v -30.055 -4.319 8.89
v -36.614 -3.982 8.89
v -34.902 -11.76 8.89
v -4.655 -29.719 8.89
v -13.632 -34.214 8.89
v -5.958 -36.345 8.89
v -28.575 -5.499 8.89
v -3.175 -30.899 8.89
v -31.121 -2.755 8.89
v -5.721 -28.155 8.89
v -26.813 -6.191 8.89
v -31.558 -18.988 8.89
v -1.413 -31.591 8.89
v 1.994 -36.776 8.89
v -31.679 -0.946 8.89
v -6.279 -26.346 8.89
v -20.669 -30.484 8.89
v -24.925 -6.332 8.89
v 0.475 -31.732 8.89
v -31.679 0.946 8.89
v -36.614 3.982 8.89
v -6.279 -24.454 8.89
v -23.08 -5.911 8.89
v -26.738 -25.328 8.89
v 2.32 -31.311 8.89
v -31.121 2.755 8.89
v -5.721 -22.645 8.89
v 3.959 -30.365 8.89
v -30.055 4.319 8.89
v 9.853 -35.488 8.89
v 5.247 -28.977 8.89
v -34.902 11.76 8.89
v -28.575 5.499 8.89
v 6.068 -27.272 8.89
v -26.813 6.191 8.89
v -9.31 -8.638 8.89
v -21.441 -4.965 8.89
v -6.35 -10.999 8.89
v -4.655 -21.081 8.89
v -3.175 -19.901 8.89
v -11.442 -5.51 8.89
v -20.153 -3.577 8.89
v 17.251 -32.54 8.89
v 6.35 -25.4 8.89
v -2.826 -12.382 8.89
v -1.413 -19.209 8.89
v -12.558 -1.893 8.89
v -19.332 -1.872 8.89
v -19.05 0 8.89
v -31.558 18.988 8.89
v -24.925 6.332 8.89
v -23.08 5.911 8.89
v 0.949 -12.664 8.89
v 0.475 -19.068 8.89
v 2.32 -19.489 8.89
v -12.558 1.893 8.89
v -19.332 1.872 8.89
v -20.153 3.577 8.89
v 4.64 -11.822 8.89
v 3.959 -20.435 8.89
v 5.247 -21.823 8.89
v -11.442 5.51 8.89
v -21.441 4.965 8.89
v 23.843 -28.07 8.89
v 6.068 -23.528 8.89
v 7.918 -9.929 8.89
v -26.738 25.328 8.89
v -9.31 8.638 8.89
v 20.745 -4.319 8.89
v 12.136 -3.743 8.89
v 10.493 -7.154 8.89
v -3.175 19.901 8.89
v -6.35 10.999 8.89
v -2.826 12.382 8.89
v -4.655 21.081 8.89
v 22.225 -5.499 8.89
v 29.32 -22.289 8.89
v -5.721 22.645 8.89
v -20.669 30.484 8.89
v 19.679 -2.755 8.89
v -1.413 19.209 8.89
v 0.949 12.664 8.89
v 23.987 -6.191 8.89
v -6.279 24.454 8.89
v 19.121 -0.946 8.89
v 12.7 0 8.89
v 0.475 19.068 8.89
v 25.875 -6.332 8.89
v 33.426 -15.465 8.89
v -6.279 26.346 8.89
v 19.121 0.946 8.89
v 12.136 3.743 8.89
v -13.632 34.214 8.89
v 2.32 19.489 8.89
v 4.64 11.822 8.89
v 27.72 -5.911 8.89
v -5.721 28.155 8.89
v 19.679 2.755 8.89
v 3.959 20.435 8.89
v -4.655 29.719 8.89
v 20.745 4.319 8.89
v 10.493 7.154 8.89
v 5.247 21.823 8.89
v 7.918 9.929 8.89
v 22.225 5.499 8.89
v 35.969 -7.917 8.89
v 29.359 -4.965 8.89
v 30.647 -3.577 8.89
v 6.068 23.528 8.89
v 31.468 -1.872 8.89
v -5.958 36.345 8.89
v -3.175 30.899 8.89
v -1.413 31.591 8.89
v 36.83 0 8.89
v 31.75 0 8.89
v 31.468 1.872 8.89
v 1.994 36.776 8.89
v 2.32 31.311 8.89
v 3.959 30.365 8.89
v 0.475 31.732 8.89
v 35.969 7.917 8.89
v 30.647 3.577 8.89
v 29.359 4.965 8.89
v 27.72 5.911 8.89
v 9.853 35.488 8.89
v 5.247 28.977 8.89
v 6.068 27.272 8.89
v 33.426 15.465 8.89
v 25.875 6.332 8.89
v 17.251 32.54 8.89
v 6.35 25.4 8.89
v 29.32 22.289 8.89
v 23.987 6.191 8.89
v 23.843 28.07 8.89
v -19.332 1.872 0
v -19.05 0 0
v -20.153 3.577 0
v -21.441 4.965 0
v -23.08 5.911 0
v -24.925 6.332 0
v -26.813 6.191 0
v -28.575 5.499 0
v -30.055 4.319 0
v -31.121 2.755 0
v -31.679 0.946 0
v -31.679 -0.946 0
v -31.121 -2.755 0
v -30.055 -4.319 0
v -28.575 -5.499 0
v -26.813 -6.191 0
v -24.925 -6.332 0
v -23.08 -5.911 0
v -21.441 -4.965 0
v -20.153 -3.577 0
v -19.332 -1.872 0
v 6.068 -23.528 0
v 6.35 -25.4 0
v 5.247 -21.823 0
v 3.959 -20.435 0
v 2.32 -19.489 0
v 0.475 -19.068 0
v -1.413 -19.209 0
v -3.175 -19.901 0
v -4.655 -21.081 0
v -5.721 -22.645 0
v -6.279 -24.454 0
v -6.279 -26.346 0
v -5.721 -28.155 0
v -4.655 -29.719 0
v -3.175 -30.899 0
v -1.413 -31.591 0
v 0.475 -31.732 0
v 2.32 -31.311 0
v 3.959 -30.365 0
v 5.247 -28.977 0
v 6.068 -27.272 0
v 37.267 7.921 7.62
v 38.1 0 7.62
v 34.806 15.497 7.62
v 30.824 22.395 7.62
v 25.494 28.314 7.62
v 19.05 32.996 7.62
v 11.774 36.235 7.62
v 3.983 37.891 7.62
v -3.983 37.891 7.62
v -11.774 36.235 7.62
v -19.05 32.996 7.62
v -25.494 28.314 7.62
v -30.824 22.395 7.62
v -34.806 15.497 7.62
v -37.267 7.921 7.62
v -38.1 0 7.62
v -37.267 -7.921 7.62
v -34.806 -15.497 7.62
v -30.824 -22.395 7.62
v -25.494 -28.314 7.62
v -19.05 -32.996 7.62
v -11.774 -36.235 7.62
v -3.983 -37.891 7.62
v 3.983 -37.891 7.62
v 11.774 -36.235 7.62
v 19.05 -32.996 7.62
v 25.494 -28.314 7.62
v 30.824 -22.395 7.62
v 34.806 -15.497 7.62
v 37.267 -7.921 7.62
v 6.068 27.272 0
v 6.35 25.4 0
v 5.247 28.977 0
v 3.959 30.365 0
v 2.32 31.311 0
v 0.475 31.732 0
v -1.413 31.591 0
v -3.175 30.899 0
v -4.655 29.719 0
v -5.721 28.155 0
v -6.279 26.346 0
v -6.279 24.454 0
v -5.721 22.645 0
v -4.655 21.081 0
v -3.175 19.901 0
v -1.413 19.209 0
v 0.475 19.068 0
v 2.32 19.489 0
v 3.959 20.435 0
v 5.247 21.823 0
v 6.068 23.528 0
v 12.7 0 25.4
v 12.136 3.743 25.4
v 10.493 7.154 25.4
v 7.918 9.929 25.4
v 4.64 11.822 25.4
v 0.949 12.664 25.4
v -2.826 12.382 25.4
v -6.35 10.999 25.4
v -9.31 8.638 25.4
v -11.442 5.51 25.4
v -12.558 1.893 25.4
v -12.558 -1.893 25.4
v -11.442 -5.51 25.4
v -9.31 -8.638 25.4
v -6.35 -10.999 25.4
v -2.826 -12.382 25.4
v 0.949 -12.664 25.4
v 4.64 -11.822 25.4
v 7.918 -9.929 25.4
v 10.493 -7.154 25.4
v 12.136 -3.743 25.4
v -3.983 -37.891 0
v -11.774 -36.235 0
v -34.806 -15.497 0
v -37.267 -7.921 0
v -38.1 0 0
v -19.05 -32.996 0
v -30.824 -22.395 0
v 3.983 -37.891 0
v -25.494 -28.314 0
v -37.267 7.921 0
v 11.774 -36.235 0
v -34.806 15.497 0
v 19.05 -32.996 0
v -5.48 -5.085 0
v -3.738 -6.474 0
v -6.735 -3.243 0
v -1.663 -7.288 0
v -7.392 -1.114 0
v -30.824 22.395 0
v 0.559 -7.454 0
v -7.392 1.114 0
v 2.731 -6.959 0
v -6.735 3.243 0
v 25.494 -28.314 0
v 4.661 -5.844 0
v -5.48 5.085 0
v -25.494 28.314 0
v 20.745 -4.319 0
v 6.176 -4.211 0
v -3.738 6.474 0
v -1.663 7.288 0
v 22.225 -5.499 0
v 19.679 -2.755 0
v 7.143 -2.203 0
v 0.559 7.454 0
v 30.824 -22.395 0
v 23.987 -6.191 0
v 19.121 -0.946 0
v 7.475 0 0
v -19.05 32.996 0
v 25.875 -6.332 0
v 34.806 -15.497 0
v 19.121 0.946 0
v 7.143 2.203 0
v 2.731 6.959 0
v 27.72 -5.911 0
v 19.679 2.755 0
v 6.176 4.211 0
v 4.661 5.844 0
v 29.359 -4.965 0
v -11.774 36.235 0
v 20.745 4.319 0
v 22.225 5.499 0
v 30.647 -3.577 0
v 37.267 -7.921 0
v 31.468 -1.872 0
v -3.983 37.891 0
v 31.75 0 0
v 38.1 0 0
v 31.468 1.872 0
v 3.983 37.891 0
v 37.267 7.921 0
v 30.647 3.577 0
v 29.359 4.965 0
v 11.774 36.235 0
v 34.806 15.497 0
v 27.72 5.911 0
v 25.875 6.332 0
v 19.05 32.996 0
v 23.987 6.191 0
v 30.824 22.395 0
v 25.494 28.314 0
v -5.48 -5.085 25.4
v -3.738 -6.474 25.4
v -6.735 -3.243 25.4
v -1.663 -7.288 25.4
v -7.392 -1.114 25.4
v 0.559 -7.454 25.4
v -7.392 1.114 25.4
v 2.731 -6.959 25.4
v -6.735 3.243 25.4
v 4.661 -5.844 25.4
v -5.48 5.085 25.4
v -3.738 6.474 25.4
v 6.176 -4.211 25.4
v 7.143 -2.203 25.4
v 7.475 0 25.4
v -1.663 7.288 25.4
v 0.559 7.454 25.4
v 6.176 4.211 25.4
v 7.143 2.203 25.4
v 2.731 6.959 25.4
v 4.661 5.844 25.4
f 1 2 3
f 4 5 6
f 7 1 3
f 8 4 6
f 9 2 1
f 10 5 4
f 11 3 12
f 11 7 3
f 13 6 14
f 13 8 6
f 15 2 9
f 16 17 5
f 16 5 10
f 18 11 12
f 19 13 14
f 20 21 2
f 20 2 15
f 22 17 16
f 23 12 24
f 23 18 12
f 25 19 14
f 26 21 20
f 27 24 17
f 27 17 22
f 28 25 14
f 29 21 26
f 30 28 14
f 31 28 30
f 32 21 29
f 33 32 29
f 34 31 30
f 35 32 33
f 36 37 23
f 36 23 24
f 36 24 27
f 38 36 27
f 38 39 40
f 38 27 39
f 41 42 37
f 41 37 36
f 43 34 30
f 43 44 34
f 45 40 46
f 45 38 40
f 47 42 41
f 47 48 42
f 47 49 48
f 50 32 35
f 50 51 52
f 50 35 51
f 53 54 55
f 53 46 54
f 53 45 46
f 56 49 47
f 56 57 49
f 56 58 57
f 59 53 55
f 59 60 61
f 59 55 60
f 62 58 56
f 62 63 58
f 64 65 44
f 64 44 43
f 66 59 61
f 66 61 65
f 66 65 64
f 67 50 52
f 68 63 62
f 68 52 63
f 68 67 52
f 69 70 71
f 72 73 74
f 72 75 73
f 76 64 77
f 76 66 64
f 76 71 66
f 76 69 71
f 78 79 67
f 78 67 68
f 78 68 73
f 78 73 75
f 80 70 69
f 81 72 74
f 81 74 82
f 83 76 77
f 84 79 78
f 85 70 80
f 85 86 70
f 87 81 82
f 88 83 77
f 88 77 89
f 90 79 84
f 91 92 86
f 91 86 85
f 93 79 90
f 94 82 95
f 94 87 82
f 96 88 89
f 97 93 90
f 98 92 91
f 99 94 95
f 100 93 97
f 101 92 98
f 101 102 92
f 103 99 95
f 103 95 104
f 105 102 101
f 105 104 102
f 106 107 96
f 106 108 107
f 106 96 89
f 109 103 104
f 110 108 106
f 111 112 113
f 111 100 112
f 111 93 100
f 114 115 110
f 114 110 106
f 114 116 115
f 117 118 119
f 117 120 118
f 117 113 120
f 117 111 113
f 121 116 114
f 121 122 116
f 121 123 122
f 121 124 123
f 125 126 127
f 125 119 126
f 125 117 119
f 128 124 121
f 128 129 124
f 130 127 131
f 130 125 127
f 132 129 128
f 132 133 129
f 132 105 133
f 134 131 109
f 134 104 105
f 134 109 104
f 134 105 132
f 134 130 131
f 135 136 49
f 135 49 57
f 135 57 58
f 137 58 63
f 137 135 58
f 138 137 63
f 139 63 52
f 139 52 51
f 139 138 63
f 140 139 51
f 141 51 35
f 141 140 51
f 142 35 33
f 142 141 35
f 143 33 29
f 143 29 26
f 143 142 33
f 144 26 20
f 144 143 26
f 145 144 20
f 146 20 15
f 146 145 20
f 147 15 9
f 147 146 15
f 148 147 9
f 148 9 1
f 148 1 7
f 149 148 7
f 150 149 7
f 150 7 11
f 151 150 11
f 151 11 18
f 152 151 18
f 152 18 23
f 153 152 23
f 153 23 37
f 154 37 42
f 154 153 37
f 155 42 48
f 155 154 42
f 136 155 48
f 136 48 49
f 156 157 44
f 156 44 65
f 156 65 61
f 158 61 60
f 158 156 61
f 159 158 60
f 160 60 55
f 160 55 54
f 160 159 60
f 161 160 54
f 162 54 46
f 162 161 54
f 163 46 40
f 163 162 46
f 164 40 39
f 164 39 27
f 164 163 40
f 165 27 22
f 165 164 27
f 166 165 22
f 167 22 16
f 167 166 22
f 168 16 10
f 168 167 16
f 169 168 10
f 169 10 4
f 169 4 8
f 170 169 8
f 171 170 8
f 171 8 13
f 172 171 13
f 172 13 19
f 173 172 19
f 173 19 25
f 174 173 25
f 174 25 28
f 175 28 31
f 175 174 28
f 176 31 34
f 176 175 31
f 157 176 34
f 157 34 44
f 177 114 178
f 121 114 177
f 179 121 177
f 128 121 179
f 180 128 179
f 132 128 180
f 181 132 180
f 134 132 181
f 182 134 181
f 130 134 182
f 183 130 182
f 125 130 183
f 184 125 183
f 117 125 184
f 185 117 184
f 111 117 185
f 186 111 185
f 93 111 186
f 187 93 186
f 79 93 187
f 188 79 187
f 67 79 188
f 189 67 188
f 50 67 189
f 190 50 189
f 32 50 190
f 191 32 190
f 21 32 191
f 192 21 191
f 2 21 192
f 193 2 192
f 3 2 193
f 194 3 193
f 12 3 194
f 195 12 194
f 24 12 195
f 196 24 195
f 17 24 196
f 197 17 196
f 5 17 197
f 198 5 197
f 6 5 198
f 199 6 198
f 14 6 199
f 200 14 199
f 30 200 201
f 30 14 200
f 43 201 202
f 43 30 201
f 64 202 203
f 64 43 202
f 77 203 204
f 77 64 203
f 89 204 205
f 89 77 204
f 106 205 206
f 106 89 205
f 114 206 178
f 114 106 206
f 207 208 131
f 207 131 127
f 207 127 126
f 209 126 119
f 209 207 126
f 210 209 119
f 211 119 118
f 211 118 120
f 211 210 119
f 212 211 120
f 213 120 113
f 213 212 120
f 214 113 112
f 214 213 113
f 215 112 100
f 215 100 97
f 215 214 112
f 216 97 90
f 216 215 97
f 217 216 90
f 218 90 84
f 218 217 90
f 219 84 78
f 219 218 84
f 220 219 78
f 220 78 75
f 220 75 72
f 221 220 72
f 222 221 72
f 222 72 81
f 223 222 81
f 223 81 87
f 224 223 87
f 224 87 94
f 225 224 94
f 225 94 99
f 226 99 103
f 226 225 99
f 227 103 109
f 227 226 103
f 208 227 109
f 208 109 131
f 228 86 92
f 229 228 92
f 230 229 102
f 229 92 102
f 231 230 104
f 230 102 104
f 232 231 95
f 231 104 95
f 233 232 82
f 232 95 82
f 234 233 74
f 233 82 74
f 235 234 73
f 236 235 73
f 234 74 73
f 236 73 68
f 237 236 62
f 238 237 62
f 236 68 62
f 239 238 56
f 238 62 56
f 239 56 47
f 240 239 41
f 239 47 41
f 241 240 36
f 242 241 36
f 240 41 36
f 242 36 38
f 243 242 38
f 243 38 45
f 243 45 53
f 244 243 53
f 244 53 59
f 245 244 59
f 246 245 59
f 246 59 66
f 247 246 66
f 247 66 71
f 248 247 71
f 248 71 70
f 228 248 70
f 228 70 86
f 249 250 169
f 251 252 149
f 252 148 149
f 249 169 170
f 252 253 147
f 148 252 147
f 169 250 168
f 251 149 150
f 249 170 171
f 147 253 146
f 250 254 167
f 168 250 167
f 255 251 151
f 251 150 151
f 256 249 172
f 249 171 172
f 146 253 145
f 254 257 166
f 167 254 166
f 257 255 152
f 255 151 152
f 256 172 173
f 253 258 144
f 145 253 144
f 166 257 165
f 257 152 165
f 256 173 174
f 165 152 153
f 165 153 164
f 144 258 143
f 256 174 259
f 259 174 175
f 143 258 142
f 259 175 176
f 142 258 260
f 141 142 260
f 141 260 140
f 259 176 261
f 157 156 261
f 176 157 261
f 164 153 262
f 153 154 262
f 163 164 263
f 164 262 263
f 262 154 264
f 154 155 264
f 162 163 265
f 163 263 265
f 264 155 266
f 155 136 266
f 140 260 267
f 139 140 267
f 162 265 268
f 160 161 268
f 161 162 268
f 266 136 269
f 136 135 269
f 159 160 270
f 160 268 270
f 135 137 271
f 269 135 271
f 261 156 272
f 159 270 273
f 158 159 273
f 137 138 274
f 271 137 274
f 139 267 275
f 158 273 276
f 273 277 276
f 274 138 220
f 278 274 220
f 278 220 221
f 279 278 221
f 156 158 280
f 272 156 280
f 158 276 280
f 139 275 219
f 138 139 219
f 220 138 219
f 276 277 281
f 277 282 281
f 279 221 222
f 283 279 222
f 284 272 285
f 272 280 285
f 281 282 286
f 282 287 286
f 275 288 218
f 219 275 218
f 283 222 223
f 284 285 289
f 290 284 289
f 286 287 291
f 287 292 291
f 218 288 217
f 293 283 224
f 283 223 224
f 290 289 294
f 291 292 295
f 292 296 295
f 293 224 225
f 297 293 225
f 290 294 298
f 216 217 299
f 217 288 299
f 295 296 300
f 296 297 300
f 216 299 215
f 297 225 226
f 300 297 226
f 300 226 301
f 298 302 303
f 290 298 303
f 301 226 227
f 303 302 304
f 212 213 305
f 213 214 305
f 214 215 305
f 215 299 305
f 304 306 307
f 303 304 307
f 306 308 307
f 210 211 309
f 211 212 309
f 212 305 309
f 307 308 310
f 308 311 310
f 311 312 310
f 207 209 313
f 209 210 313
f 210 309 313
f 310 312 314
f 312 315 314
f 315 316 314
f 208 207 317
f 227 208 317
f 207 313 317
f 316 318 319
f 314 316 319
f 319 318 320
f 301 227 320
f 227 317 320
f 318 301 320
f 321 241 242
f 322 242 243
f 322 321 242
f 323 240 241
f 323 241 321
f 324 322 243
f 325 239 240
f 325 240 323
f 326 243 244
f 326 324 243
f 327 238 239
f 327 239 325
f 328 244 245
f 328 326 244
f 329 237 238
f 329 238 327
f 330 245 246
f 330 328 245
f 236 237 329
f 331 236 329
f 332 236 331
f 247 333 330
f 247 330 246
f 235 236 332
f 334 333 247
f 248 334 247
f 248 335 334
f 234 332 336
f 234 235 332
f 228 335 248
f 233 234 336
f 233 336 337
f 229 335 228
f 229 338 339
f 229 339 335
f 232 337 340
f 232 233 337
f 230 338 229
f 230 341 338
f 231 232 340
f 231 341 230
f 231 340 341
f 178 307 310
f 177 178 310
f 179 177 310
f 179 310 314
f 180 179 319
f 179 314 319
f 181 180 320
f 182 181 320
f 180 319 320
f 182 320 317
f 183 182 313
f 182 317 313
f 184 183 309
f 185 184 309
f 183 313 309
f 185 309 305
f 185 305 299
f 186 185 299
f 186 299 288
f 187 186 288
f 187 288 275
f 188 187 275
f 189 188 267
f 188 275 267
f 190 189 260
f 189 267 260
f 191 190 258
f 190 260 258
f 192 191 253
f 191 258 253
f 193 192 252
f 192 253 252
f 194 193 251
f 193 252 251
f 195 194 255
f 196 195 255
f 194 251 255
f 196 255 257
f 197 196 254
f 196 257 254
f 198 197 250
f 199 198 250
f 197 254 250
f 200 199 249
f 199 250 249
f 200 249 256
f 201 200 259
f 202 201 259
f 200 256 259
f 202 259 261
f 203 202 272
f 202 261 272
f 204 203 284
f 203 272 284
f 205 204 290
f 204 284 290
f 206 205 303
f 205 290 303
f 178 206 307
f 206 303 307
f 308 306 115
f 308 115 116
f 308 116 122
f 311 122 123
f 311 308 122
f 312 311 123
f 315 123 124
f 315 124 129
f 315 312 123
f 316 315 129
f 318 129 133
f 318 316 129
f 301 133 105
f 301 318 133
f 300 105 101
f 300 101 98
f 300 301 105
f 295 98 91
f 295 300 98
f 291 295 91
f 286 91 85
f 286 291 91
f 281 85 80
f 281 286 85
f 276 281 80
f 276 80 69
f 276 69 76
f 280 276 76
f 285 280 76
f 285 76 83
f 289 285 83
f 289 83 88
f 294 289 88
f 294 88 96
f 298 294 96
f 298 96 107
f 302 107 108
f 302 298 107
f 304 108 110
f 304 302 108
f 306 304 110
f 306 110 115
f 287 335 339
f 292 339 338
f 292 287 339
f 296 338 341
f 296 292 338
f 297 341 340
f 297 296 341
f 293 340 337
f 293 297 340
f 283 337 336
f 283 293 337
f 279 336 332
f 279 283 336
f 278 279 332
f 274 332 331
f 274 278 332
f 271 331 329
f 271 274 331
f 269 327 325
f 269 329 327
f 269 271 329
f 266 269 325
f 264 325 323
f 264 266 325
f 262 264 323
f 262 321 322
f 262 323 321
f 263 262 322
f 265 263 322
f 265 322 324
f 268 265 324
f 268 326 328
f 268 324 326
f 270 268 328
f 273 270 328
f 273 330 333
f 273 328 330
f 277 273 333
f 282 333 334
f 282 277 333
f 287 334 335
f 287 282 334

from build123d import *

# Parameters (mm, degrees)
F0_R     = 38.1
F0_R_2   = 6.35
F0_R_3   = 12.7
F1_DEPTH = 8.89
F2_SIZE  = 1.27
F3_DEPTH = 25.4
F4_R     = 7.47533
F5_DEPTH = 173.482


with BuildPart() as f1:
    # F0 (on Top) → F1 (new body)
    with BuildSketch(Plane.XY):
        Circle(F0_R)
        with Locations((0, -25.4)):
            Circle(F0_R_2, mode=Mode.SUBTRACT)
        with Locations((-25.4, 0)):
            Circle(F0_R_2, mode=Mode.SUBTRACT)
        Circle(F0_R_3, mode=Mode.SUBTRACT)
        with Locations((25.4, 0)):
            Circle(F0_R_2, mode=Mode.SUBTRACT)
        with Locations((0, 25.4)):
            Circle(F0_R_2, mode=Mode.SUBTRACT)
    extrude(amount=F1_DEPTH)

    # F2
    f2_edges = [f1.edges().sort_by_distance(p)[0] for p in [
        (-38.1, 0, 8.89),
    ]]
    chamfer(f2_edges, length=F2_SIZE)

    # F0 (on Top) → F3 (join)
    with BuildSketch(Plane.XY):
        Circle(F0_R_3)
    extrude(amount=F3_DEPTH)

    # F4 (on Top) → F5 (cut)
    with BuildSketch(Plane.XY):
        Circle(F4_R)
    extrude(amount=F5_DEPTH, mode=Mode.SUBTRACT)


solid = f1.part
